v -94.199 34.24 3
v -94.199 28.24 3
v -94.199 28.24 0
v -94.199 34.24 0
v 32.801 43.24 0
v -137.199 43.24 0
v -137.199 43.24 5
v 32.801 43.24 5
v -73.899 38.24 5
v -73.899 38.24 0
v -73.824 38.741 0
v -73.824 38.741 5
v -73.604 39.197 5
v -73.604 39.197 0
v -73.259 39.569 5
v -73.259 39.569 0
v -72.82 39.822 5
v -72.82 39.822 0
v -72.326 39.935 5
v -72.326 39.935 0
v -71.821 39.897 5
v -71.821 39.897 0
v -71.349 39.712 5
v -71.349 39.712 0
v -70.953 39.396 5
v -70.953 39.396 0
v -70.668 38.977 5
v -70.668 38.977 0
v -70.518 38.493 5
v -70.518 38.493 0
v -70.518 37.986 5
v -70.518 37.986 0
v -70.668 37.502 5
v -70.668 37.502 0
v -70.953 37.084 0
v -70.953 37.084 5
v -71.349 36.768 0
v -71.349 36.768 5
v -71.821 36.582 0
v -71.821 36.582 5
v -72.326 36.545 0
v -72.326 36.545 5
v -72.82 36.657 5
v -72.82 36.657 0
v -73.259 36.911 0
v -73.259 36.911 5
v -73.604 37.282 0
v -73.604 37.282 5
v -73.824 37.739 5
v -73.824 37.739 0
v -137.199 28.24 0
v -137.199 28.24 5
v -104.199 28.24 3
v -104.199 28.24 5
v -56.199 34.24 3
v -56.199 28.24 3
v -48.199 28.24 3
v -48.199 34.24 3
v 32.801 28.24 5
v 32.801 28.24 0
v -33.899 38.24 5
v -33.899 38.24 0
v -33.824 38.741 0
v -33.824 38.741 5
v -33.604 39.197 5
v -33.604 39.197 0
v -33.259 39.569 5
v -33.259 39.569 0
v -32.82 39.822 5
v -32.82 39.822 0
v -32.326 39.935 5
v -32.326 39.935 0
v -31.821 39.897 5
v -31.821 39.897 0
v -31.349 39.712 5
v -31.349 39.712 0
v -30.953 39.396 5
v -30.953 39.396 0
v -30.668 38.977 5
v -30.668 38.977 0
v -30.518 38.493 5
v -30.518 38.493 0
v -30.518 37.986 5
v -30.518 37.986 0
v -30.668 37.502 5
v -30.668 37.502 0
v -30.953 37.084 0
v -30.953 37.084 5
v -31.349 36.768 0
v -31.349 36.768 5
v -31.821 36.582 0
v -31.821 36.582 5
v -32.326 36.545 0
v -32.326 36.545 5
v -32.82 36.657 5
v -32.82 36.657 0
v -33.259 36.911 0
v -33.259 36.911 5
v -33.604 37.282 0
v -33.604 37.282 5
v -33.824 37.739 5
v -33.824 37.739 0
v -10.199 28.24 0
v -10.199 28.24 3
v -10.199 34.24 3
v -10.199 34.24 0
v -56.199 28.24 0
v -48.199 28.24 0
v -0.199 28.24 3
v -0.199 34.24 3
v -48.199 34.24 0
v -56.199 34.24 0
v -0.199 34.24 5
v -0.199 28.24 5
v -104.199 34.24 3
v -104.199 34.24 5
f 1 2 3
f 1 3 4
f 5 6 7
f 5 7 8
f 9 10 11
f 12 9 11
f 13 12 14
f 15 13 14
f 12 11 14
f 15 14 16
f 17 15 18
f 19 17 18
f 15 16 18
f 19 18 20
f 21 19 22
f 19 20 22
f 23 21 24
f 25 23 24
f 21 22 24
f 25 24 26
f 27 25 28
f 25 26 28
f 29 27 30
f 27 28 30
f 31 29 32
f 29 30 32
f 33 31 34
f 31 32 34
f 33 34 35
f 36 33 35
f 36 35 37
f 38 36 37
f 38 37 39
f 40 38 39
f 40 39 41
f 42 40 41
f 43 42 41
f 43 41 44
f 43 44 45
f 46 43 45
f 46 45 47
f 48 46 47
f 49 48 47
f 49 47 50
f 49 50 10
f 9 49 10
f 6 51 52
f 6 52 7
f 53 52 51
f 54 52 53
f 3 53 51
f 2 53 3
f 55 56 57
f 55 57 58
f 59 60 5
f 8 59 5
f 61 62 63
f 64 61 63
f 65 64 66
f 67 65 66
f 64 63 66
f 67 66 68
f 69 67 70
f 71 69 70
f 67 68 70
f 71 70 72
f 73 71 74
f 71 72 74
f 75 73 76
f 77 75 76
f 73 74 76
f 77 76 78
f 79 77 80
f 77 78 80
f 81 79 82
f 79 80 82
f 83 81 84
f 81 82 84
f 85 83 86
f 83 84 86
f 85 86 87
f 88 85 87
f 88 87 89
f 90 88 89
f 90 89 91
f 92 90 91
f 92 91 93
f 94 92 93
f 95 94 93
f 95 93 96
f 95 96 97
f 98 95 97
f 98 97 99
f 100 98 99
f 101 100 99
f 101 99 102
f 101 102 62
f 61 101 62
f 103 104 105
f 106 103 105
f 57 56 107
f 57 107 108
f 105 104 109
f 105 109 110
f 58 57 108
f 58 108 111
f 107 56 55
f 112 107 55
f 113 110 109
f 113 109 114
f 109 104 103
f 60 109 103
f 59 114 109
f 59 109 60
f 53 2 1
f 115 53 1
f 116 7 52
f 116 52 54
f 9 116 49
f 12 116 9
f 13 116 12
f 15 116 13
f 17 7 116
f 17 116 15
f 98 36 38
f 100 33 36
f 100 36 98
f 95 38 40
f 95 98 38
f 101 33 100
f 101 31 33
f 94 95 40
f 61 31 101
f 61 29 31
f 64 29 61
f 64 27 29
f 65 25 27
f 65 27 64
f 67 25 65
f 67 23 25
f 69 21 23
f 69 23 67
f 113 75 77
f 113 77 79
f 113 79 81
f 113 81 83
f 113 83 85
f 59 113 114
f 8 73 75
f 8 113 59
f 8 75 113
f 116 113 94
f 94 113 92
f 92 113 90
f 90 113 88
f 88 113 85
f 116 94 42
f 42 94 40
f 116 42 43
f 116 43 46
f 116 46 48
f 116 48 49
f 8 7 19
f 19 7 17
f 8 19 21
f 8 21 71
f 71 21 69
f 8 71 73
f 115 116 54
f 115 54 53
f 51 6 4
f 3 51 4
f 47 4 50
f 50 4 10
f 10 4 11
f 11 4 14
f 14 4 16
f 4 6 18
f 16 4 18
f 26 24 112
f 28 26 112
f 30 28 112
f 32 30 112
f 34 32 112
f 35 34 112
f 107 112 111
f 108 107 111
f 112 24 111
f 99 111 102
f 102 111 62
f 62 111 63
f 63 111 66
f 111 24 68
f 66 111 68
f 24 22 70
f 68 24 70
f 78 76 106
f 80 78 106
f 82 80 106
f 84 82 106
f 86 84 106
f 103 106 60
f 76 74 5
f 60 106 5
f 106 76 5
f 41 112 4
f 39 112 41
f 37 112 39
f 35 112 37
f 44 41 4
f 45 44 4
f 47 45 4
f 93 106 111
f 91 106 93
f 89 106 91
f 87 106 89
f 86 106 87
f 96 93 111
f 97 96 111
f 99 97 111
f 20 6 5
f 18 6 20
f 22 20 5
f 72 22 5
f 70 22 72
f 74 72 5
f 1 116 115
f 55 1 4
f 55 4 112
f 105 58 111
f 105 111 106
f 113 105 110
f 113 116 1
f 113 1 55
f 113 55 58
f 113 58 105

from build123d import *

# Parameters (mm, degrees)
SZKIC1_W                    = 170
SZKIC1_H                    = 20
DODANIE_WYCI_GNI_CIE1_DEPTH = 5
GNIAZDO1_START              = 3
GNIAZDO1_OUTLINE_W          = 100
GNIAZDO1_OUTLINE_H          = 10
GNIAZDO1_DEPTH              = 1
GNIAZDO1_START_2            = 4
GNIAZDO1_2_OUTLINE_W        = 100
GNIAZDO1_2_OUTLINE_H        = 1
GNIAZDO1_2_DEPTH            = 1
SZKIC2_W                    = 100
SZKIC2_H                    = 10
WYTNIJ_WYCI_GNI_CIE1_DEPTH  = 10
SZKIC3_W                    = 2
SZKIC3_H                    = 10
WYTNIJ_WYCI_GNI_CIE2_DEPTH  = 2
SZKIC4_W                    = 2
SZKIC4_H                    = 10
WYTNIJ_WYCI_GNI_CIE3_DEPTH  = 2
SZKIC5_W                    = 104
SZKIC5_H                    = 2
WYTNIJ_WYCI_GNI_CIE4_DEPTH  = 1
SZKIC6_R                    = 1.7
WYTNIJ_WYCI_GNI_CIE5_DEPTH  = 10
WYTNIJ_WYCI_GNI_CIE6_DEPTH  = 5
SZKIC8_W                    = 38
SZKIC8_H                    = 6
WYTNIJ_WYCI_GNI_CIE7_DEPTH  = 10


# Read off the part's stored shape, not the designer's step: Gniazdo1
with BuildPart() as part:
    # Szkic1 → Dodanie-wyciągnięcie1 (new body)
    with BuildSketch(Plane.XY):
        with Locations((-52.199192033, 33.239845261)):
            Rectangle(SZKIC1_W, SZKIC1_H)
    extrude(amount=DODANIE_WYCI_GNI_CIE1_DEPTH)

    # Gniazdo1 outline → Gniazdo1 (cut)
    with BuildSketch(Plane.XY.offset(GNIAZDO1_START)):
        with Locations((-52.199192033, 28.239845261)):
            Rectangle(GNIAZDO1_OUTLINE_W, GNIAZDO1_OUTLINE_H)
    extrude(amount=GNIAZDO1_DEPTH, mode=Mode.SUBTRACT)

    # Gniazdo1 2 outline → Gniazdo1 2 (cut)
    with BuildSketch(Plane.XY.offset(GNIAZDO1_START_2)):
        with Locations((-52.199192033, 32.739845261)):
            Rectangle(GNIAZDO1_2_OUTLINE_W, GNIAZDO1_2_OUTLINE_H)
    extrude(amount=GNIAZDO1_2_DEPTH, mode=Mode.SUBTRACT)

    # Szkic2 → Wytnij-wyciągnięcie1 (cut)
    with BuildSketch(Plane.XY.offset(3)):
        with Locations((-52.199192033, 28.239845261)):
            Rectangle(SZKIC2_W, SZKIC2_H)
    extrude(amount=WYTNIJ_WYCI_GNI_CIE1_DEPTH, mode=Mode.SUBTRACT)

    # Szkic3 → Wytnij-wyciągnięcie2 (cut)
    with BuildSketch(Plane(origin=(-102.199192033, 0, 0), x_dir=(0, 0, -1), z_dir=(1, 0, 0))):
        with Locations((-4, 28.239845261)):
            Rectangle(SZKIC3_W, SZKIC3_H)
    extrude(amount=-WYTNIJ_WYCI_GNI_CIE2_DEPTH, mode=Mode.SUBTRACT)

    # Szkic4 → Wytnij-wyciągnięcie3 (cut)
    with BuildSketch(Plane.ZY.offset(2.199192033)):
        with Locations((4, 28.239845261)):
            Rectangle(SZKIC4_W, SZKIC4_H)
    extrude(amount=-WYTNIJ_WYCI_GNI_CIE3_DEPTH, mode=Mode.SUBTRACT)

    # Szkic5 → Wytnij-wyciągnięcie4 (cut)
    with BuildSketch(Plane.XZ.offset(-33.239845261)):
        with Locations((-52.199192033, 4)):
            Rectangle(SZKIC5_W, SZKIC5_H)
    extrude(amount=-WYTNIJ_WYCI_GNI_CIE4_DEPTH, mode=Mode.SUBTRACT)

    # Szkic6 → Wytnij-wyciągnięcie5 (cut)
    with BuildSketch(Plane(origin=(0, 0, 0), x_dir=(-1, 0, 0), z_dir=(0, 0, -1))):
        with Locations((72.199192033, 38.239845261)):
            Circle(SZKIC6_R)
        with Locations((32.199192033, 38.239845261)):
            Circle(SZKIC6_R)
    extrude(amount=-WYTNIJ_WYCI_GNI_CIE5_DEPTH, mode=Mode.SUBTRACT)

    # Szkic7 → Wytnij-wyciągnięcie6 (cut)
    with BuildSketch(Plane.XZ.offset(-23.239845261)):
        Polygon((-0.199192033, 3), (-104.199192033, 3), (-104.199192033, 5), (-137.199192033, 5), (-137.199192033, 3), (-137.653937347, 3), (-137.653937347, 0), (-0.199192033, 0), (33.231073198, 0), (33.231073198, 3), (33.231073198, 5), (-0.199192033, 5), align=None)
    extrude(amount=-WYTNIJ_WYCI_GNI_CIE6_DEPTH, mode=Mode.SUBTRACT)

    # Szkic8 → Wytnij-wyciągnięcie7 (cut)
    with BuildSketch(Plane.XY.offset(3)):
        with Locations((-75.199192033, 31.239845261)):
            Rectangle(SZKIC8_W, SZKIC8_H)
        with Locations((-29.199192033, 31.239845261)):
            Rectangle(SZKIC8_W, SZKIC8_H)
    extrude(amount=-WYTNIJ_WYCI_GNI_CIE7_DEPTH, mode=Mode.SUBTRACT)


solid = part.part
